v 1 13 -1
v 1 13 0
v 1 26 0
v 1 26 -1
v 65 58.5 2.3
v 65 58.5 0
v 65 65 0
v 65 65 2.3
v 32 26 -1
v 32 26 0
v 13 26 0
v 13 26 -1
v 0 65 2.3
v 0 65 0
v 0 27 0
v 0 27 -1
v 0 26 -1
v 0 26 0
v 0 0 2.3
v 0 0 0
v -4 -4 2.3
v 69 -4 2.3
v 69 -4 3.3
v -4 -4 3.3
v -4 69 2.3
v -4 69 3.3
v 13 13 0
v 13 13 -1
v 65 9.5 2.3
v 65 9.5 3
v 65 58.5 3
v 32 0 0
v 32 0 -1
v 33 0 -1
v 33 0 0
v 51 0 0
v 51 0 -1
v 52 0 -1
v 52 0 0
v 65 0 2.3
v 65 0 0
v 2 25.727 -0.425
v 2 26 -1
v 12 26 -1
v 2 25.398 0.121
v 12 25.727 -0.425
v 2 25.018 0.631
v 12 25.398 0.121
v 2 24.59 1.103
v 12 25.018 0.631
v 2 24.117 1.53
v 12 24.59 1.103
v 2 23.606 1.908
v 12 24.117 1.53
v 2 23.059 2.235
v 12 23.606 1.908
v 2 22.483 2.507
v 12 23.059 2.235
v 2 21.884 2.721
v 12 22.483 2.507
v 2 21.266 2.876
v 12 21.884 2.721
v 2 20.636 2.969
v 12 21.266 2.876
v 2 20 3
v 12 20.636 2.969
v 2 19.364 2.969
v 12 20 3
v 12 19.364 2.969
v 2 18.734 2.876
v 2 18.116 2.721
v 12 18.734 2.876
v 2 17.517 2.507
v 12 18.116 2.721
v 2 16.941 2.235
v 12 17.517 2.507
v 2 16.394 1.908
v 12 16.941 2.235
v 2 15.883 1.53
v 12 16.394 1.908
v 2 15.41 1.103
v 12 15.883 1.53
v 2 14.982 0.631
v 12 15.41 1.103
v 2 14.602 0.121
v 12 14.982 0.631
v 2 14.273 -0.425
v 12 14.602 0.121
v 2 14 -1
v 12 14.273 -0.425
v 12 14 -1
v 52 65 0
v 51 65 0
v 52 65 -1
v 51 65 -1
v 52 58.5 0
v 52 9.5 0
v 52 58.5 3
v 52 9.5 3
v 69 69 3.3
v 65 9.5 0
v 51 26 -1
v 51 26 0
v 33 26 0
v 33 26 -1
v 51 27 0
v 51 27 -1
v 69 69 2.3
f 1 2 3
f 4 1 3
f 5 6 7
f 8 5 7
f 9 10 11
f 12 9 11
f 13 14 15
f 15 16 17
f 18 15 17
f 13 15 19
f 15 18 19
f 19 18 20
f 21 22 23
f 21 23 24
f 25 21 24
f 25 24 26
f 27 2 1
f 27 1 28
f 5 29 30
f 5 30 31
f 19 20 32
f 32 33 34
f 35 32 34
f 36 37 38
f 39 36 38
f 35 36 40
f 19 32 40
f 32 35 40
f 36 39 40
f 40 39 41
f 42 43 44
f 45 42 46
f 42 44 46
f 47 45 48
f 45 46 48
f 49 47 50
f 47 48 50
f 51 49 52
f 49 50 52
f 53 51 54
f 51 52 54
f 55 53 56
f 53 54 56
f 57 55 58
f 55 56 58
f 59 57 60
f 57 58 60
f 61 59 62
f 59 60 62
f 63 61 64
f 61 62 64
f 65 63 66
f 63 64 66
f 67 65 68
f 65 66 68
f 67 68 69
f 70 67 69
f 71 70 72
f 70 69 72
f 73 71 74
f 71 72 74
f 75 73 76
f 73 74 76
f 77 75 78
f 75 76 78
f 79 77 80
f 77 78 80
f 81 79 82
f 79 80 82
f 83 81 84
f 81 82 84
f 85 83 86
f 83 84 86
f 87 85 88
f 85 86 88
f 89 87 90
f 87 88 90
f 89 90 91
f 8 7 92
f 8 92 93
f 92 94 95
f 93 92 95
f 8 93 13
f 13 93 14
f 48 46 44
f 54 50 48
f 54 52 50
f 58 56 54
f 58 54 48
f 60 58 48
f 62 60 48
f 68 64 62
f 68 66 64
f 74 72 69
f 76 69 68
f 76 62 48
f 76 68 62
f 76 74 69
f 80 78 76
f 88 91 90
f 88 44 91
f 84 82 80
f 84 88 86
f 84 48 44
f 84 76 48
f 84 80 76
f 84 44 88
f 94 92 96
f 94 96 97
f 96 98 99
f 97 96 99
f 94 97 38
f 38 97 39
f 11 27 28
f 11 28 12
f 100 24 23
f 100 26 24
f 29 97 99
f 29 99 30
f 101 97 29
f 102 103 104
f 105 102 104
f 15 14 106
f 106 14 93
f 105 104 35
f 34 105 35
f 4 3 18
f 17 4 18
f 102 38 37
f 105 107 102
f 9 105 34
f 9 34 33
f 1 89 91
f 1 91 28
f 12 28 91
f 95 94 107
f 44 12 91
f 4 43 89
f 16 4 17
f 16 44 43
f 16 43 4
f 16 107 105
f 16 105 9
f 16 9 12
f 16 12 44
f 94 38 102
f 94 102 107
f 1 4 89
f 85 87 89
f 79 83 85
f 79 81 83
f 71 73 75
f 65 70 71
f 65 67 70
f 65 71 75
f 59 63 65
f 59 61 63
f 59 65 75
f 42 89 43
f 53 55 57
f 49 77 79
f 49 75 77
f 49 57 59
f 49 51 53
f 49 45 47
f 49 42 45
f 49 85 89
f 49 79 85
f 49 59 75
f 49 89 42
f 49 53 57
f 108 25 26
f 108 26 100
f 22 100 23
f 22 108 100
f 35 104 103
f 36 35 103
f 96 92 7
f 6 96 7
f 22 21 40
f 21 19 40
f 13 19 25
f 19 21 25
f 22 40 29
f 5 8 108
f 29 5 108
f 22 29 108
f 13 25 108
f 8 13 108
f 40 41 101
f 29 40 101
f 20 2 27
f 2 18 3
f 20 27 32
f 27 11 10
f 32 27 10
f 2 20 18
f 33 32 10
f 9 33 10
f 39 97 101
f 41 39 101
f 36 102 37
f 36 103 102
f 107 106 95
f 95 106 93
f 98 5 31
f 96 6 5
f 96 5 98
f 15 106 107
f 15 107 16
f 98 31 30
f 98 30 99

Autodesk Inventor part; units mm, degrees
ref_plane "YZ Plane" through (0, 0, 0) normal (1, 0, 0) x (0, 1, 0)
ref_plane "XZ Plane" through (0, 0, 0) normal (0, 1, 0) x (-1, 0, 0)
ref_plane "XY Plane" through (0, 0, 0) normal (0, 0, 1) x (1, 0, 0)
sketch "Sketch1" plane through (0, 0, 0) normal (0, 0, 1) x (1, 0, 0)
  line L0 (0, 0) -> (65, 0)
  line L1 (65, 0) -> (65, 65)
  line L2 (65, 65) -> (0, 65)
  line L3 (0, 65) -> (0, 0)
  dimension "d0" = 65
  dimension "d1" = 65
extrude "Extrusion1" add sketch "Sketch1" along normal blind 2.3
sketch "Sketch2" plane through (0, 0, 2.3) normal (0, 0, 1) x (1, 0, 0)
  line L0 (-4, 69) -> (69, 69)
  line L1 (69, 69) -> (69, -4)
  line L2 (69, -4) -> (-4, -4)
  line L3 (-4, -4) -> (-4, 69)
  point P0 (0, 0)
  point P1 (0, 65)
  point P2 (65, 0)
extrude "Extrusion2" add sketch "Sketch2" along normal blind 1
sketch "Sketch3" plane through (0, 0, 0) normal (0, 0, -1) x (-1, 0, 0)
  line L0 (0, 0) -> (-65, 0) projected
  line L1 (0, 65) -> (0, 0) projected
  line L2 (-65, 0) -> (-65, 65) projected
  line L3 (-52, 65) -> (-52, 26)
  line L4 (-52, 26) -> (0, 26)
  line L5 (-51, 27) -> (-51, 65)
  line L6 (-51, 65) -> (-52, 65)
  line L7 (0, 65) -> (-1, 65)
  line L8 (-51, 27) -> (0, 27)
  point P0 (0, 26)
extrude "Extrusion5" add sketch "Sketch3" along normal blind 1
sketch "Sketch6" plane through (0, 0, 0) normal (0, 0, -1) x (-1, 0, 0)
  line L0 (-65, 65) -> (-52, 65) projected
  line L1 (-65, 55.5) -> (-52, 55.5)
  line L2 (-52, 26) -> (-52, 65) projected
  line L3 (-52, 55.5) -> (-52, 9.5)
  line L4 (-52, 9.5) -> (-65, 9.5)
  line L5 (-65, 9.5) -> (-65, 55.5)
  line L6 (-65, 0) -> (-65, 65) projected
  point P0 (0, 0)
  dimension "d23" = 46
extrude "Extrusion6" cut sketch "Sketch6" against normal blind 3 contours L1 L2 L3 L4 L5
sketch "Sketch7" plane through (0, 0, 0) normal (0, 0, -1) x (-1, 0, 0)
  line L0 (-65, 9.5) -> (-65, 55.5) projected
  line L1 (-52, 55.5) -> (-52, 65) projected
  line L2 (-52, 55.5) -> (-65, 55.5)
  line L3 (-65, 55.5) -> (-65, 58.5)
  line L4 (-65, 58.5) -> (-52, 58.5)
  line L5 (-52, 58.5) -> (-52, 55.5)
  point P0 (0, 0)
extrude "Extrusion7" cut sketch "Sketch7" against normal blind 3
sketch "Sketch8" plane through (0, 0, 0) normal (0, 0, -1) x (-1, 0, 0)
  line L0 (-52, 26) -> (-52, 9.5) projected
  line L1 (-52, 26) -> (-52, 0)
  line L2 (-52, 26) -> (-51, 26)
  line L3 (-51, 26) -> (-51, 0)
  line L4 (0, 0) -> (-65, 0) projected
  line L5 (-52, 0) -> (-51, 0)
  line L6 (-51, 26) -> (-33, 26)
  line L7 (0, 26) -> (-52, 26) projected
  line L8 (-33, 26) -> (-33, 0)
  line L9 (-33, 0) -> (-32, 0)
  line L10 (-32, 0) -> (-32, 26)
  line L11 (-32, 26) -> (-33, 26)
  dimension "d32" = 1
extrude "Extrusion8" add sketch "Sketch8" along normal blind 1 contours L2 L3 L4 L1 L0 | L7 L10 L4 L8
sketch "Sketch9" plane through (0, 0, 0) normal (0, 0, -1) x (-1, 0, 0)
  line L0 (0, 26) -> (0, 0) projected
  line L1 (0, 26) -> (-32, 26) projected
  line L2 (-2, 26) -> (-12, 26)
  line L3 (-12, 26) -> (-12, 14)
  line L4 (-12, 14) -> (-2, 14)
  line L5 (-2, 14) -> (-2, 26)
  line L6 (-1, 13) -> (-13, 13)
  line L7 (-13, 13) -> (-13, 26)
  line L8 (-1, 13) -> (-1, 26)
  line L9 (-12, 26) -> (-13, 26)
  line L10 (-2, 26) -> (-1, 26)
  dimension "d35" = 2
  dimension "d36" = 10
  dimension "d37" = 12
extrude "Extrusion9" add sketch "Sketch9" along normal blind 1 contours L8 L6 L7 L1 L3 L4 L5
sketch "Sketch12" plane through (0, 0, 0) normal (0, 0, -1) x (-1, 0, 0)
  line L0 (-12, 14) -> (-2, 14) projected
  line L1 (-12, 26) -> (-2, 26) projected
  line L2 (-12, 14) -> (-2, 14)
  line L3 (-2, 14) -> (-2, 26)
  line L4 (-2, 26) -> (-12, 26)
  line L5 (-12, 26) -> (-12, 14)
  point P0 (0, 0)
extrude "Extrusion11" cut sketch "Sketch12" against normal blind 3
fillet "Fillet1" radius 6.5 2 edges at (7, 14, 3) (7, 26, 3)
properties part number "CaseBottom"
